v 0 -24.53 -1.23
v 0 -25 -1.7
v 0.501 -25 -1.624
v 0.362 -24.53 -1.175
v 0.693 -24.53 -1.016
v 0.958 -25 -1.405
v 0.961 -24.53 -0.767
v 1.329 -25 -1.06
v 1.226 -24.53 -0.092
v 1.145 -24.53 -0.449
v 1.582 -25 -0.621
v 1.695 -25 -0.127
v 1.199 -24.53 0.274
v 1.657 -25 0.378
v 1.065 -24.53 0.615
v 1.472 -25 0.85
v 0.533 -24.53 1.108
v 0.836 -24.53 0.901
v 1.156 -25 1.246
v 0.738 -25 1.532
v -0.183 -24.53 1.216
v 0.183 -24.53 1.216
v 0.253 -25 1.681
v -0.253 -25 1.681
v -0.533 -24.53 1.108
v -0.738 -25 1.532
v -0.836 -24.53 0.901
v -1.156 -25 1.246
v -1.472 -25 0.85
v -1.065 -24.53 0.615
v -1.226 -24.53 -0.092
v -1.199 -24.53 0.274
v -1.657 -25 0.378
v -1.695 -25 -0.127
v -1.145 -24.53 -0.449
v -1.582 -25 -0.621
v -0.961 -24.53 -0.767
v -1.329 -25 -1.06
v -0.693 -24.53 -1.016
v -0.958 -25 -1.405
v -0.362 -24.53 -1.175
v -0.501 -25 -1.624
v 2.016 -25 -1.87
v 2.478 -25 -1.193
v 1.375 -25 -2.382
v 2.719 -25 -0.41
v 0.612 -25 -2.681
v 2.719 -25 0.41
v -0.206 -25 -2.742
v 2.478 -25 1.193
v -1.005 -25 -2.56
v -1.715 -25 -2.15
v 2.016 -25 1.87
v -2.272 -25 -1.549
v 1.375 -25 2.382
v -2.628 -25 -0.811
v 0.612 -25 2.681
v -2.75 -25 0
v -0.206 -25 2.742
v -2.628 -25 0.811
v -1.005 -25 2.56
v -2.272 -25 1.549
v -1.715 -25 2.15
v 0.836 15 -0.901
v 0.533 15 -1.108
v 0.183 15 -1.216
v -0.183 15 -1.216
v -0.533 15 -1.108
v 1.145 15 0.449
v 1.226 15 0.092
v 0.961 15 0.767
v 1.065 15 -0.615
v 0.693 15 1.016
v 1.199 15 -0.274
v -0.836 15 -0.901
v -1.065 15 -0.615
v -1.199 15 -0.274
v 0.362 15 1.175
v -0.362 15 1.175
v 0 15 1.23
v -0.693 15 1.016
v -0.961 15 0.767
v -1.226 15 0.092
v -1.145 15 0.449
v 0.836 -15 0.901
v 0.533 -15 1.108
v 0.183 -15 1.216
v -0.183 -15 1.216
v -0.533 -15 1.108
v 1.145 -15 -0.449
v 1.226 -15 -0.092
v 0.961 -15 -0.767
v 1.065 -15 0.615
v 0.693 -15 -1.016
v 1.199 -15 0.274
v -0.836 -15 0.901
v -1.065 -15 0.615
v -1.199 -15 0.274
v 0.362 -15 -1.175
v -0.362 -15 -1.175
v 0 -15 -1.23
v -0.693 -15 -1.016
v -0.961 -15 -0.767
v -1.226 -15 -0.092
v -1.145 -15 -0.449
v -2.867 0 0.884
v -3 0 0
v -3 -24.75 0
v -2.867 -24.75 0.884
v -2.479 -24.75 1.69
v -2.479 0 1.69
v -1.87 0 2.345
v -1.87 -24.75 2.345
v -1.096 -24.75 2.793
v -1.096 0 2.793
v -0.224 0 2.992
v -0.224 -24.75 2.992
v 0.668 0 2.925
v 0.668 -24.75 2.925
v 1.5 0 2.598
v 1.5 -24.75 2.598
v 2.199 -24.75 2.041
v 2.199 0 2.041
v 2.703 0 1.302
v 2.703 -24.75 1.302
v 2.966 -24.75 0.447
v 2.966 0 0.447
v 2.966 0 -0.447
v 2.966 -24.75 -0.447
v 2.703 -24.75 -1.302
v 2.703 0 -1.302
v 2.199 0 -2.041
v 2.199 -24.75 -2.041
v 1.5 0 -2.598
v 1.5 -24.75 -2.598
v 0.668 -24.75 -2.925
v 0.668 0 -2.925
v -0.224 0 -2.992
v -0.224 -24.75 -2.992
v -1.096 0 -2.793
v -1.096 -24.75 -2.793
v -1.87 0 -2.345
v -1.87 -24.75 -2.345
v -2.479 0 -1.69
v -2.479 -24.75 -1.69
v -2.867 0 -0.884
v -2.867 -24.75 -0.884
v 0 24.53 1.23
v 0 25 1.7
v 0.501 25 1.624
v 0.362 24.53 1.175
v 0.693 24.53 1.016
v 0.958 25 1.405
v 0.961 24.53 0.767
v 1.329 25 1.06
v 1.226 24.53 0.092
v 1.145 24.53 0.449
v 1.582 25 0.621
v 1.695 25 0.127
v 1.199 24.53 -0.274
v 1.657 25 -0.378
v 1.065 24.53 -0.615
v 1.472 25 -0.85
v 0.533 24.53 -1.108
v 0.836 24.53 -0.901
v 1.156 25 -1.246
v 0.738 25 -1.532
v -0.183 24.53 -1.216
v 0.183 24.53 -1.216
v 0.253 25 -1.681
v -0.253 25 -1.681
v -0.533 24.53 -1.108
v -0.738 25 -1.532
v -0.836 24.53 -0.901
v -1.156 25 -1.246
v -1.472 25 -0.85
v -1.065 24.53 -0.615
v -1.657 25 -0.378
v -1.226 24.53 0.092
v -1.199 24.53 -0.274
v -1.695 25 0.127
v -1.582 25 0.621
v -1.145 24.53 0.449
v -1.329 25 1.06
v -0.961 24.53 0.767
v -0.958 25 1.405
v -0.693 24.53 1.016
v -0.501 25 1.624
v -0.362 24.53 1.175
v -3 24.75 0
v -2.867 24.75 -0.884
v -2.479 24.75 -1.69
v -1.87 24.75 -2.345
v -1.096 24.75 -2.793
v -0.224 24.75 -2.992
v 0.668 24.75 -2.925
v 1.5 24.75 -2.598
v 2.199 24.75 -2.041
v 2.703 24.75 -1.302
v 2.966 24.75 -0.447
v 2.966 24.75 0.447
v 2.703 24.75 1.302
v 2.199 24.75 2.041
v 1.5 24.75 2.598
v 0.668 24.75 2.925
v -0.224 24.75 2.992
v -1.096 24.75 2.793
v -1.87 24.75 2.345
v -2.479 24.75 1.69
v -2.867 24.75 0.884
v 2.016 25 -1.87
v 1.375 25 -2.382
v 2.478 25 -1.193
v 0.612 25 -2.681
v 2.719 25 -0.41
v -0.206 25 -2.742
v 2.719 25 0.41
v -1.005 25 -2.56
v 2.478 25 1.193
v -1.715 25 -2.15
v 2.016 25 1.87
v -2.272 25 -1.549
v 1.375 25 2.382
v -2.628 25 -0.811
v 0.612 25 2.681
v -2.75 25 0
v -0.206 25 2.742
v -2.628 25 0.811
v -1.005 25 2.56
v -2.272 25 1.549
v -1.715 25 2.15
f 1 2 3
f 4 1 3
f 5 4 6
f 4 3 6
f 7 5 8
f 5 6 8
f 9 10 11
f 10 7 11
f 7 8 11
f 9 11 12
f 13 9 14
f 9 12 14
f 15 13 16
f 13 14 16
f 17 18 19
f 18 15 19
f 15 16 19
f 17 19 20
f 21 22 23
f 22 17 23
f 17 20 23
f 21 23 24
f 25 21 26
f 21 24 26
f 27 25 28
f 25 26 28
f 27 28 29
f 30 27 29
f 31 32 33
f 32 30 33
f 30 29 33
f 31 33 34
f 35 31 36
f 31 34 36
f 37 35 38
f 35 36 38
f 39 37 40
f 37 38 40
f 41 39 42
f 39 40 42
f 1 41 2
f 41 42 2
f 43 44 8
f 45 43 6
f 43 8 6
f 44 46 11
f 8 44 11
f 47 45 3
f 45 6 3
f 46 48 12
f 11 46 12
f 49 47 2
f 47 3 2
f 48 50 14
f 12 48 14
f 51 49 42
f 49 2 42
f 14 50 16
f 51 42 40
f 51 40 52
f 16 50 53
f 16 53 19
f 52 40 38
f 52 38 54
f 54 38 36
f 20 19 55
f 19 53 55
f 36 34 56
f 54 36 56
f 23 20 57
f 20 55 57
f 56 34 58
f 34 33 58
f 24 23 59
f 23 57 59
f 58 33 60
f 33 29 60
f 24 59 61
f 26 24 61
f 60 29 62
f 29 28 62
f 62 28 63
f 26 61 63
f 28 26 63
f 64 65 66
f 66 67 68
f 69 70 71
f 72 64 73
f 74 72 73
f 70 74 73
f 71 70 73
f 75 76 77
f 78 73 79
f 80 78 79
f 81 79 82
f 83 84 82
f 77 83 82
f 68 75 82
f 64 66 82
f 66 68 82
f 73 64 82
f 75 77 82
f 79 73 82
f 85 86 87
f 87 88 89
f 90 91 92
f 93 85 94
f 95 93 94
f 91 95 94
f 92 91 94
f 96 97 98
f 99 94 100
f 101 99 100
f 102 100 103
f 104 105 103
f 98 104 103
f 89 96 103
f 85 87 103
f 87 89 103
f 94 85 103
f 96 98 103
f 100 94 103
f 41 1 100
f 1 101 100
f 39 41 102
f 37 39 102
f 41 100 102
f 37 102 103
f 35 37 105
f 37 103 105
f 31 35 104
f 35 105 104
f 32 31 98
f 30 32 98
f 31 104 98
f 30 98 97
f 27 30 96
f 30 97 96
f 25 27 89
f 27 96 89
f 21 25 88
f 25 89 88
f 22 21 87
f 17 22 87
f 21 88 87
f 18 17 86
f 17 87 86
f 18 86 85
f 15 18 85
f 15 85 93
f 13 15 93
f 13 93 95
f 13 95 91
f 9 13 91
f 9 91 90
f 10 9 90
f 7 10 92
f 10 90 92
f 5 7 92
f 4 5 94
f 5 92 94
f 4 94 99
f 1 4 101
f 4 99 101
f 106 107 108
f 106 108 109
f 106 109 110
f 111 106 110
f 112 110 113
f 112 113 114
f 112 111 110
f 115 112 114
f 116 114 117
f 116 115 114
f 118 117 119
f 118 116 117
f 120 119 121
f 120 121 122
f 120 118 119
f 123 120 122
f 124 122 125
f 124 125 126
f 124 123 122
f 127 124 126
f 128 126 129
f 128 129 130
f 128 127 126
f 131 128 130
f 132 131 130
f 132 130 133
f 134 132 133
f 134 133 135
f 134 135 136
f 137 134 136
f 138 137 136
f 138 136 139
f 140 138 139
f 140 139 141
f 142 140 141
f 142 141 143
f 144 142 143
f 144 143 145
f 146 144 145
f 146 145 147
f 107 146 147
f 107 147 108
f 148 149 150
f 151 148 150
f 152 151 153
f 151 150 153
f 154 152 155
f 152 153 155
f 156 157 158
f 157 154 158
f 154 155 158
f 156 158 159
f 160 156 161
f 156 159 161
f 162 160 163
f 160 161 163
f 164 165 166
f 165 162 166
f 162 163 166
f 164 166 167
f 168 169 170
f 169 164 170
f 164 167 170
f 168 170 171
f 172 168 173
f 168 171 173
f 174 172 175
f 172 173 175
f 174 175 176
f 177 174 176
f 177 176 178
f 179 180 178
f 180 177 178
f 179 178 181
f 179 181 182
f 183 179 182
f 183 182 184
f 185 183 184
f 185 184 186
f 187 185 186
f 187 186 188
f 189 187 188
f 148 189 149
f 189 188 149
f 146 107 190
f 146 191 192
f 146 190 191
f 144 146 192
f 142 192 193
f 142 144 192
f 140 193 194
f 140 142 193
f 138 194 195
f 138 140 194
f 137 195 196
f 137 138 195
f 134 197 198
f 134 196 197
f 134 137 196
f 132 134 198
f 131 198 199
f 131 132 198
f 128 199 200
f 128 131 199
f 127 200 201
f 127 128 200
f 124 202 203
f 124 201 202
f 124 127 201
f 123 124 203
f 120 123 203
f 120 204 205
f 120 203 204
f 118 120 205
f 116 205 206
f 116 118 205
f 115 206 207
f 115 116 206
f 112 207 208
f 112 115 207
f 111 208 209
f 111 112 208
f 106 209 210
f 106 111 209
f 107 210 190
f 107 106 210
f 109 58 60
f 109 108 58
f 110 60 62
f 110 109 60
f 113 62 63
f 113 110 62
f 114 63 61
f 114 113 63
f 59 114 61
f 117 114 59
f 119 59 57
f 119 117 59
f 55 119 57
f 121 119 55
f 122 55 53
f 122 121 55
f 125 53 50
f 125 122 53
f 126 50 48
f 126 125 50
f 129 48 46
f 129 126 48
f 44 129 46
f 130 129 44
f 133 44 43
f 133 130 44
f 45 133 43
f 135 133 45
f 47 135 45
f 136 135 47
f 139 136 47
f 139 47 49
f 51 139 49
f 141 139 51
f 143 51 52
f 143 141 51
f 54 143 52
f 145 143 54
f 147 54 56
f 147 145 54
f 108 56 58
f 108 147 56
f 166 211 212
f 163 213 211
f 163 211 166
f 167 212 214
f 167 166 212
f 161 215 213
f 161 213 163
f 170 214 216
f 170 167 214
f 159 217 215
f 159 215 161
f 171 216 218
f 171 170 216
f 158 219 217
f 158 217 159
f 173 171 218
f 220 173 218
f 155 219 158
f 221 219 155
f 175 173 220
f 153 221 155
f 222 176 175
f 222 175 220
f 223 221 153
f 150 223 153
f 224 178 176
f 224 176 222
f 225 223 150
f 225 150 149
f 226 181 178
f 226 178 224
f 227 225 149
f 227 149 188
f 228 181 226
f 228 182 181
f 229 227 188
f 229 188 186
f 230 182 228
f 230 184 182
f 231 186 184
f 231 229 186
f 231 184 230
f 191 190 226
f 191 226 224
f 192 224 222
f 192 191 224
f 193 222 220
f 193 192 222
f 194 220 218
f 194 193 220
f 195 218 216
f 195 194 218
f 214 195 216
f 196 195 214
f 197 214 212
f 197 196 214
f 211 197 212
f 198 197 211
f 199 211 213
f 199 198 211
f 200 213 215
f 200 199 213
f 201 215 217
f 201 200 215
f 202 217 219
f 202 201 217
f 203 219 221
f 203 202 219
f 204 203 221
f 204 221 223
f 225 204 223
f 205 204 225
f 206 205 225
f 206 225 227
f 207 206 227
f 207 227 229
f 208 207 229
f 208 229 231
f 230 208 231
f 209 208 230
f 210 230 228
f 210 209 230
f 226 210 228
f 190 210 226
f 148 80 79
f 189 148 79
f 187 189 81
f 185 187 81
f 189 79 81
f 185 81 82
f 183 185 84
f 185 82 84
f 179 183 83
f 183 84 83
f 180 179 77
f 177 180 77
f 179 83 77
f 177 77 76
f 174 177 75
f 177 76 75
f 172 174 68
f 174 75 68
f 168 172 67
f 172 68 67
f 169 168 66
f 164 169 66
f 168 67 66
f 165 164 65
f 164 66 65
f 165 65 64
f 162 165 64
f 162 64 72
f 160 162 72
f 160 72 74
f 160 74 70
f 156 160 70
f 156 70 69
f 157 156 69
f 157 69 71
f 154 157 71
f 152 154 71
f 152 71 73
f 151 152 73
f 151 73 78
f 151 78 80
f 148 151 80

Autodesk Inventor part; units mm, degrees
ref_plane "YZ Plane" through (0, 0, 0) normal (1, 0, 0) x (0, 1, 0)
ref_plane "XZ Plane" through (0, 0, 0) normal (0, 1, 0) x (-1, 0, 0)
ref_plane "XY Plane" through (0, 0, 0) normal (0, 0, 1) x (1, 0, 0)
sketch "スケッチ1" plane through (0, 0, 0) normal (0, 1, 0) x (-1, 0, 0)
  circle A0 centre (0, 0) radius 3
  dimension "d0" = 6
extrude "押し出し1" add sketch "スケッチ1" along normal mid plane 50
sketch "スケッチ2" plane through (0, 25, 0) normal (0, 1, 0) x (1, 0, 0)
  point P0 (0, 0)
  point P1 (0, 0)
hole "穴1" at (0, 25, 0) direction (0, -1, 0) diameter 2.459 depth 10 countersink diameter 3.4 countersink angle 90 thread size "M3x0.5" class "6H" standard "ISO Metric profile"
sketch "スケッチ3" plane through (0, -25, 0) normal (0, -1, 0) x (1, 0, 0)
  point P0 (0, 0)
  point P1 (0, 0)
hole "穴2" at (0, -25, 0) direction (0, 1, 0) diameter 2.459 depth 10 countersink diameter 3.4 countersink angle 90 thread size "M3x0.5" class "6H" standard "ISO Metric profile"
chamfer "面取り1" distance 0.25 angle 45 2 edges at (3, -25, 0) (3, 25, 0)
properties part number "Spacer_M3D6L45" material "アルミニウム 6061"
